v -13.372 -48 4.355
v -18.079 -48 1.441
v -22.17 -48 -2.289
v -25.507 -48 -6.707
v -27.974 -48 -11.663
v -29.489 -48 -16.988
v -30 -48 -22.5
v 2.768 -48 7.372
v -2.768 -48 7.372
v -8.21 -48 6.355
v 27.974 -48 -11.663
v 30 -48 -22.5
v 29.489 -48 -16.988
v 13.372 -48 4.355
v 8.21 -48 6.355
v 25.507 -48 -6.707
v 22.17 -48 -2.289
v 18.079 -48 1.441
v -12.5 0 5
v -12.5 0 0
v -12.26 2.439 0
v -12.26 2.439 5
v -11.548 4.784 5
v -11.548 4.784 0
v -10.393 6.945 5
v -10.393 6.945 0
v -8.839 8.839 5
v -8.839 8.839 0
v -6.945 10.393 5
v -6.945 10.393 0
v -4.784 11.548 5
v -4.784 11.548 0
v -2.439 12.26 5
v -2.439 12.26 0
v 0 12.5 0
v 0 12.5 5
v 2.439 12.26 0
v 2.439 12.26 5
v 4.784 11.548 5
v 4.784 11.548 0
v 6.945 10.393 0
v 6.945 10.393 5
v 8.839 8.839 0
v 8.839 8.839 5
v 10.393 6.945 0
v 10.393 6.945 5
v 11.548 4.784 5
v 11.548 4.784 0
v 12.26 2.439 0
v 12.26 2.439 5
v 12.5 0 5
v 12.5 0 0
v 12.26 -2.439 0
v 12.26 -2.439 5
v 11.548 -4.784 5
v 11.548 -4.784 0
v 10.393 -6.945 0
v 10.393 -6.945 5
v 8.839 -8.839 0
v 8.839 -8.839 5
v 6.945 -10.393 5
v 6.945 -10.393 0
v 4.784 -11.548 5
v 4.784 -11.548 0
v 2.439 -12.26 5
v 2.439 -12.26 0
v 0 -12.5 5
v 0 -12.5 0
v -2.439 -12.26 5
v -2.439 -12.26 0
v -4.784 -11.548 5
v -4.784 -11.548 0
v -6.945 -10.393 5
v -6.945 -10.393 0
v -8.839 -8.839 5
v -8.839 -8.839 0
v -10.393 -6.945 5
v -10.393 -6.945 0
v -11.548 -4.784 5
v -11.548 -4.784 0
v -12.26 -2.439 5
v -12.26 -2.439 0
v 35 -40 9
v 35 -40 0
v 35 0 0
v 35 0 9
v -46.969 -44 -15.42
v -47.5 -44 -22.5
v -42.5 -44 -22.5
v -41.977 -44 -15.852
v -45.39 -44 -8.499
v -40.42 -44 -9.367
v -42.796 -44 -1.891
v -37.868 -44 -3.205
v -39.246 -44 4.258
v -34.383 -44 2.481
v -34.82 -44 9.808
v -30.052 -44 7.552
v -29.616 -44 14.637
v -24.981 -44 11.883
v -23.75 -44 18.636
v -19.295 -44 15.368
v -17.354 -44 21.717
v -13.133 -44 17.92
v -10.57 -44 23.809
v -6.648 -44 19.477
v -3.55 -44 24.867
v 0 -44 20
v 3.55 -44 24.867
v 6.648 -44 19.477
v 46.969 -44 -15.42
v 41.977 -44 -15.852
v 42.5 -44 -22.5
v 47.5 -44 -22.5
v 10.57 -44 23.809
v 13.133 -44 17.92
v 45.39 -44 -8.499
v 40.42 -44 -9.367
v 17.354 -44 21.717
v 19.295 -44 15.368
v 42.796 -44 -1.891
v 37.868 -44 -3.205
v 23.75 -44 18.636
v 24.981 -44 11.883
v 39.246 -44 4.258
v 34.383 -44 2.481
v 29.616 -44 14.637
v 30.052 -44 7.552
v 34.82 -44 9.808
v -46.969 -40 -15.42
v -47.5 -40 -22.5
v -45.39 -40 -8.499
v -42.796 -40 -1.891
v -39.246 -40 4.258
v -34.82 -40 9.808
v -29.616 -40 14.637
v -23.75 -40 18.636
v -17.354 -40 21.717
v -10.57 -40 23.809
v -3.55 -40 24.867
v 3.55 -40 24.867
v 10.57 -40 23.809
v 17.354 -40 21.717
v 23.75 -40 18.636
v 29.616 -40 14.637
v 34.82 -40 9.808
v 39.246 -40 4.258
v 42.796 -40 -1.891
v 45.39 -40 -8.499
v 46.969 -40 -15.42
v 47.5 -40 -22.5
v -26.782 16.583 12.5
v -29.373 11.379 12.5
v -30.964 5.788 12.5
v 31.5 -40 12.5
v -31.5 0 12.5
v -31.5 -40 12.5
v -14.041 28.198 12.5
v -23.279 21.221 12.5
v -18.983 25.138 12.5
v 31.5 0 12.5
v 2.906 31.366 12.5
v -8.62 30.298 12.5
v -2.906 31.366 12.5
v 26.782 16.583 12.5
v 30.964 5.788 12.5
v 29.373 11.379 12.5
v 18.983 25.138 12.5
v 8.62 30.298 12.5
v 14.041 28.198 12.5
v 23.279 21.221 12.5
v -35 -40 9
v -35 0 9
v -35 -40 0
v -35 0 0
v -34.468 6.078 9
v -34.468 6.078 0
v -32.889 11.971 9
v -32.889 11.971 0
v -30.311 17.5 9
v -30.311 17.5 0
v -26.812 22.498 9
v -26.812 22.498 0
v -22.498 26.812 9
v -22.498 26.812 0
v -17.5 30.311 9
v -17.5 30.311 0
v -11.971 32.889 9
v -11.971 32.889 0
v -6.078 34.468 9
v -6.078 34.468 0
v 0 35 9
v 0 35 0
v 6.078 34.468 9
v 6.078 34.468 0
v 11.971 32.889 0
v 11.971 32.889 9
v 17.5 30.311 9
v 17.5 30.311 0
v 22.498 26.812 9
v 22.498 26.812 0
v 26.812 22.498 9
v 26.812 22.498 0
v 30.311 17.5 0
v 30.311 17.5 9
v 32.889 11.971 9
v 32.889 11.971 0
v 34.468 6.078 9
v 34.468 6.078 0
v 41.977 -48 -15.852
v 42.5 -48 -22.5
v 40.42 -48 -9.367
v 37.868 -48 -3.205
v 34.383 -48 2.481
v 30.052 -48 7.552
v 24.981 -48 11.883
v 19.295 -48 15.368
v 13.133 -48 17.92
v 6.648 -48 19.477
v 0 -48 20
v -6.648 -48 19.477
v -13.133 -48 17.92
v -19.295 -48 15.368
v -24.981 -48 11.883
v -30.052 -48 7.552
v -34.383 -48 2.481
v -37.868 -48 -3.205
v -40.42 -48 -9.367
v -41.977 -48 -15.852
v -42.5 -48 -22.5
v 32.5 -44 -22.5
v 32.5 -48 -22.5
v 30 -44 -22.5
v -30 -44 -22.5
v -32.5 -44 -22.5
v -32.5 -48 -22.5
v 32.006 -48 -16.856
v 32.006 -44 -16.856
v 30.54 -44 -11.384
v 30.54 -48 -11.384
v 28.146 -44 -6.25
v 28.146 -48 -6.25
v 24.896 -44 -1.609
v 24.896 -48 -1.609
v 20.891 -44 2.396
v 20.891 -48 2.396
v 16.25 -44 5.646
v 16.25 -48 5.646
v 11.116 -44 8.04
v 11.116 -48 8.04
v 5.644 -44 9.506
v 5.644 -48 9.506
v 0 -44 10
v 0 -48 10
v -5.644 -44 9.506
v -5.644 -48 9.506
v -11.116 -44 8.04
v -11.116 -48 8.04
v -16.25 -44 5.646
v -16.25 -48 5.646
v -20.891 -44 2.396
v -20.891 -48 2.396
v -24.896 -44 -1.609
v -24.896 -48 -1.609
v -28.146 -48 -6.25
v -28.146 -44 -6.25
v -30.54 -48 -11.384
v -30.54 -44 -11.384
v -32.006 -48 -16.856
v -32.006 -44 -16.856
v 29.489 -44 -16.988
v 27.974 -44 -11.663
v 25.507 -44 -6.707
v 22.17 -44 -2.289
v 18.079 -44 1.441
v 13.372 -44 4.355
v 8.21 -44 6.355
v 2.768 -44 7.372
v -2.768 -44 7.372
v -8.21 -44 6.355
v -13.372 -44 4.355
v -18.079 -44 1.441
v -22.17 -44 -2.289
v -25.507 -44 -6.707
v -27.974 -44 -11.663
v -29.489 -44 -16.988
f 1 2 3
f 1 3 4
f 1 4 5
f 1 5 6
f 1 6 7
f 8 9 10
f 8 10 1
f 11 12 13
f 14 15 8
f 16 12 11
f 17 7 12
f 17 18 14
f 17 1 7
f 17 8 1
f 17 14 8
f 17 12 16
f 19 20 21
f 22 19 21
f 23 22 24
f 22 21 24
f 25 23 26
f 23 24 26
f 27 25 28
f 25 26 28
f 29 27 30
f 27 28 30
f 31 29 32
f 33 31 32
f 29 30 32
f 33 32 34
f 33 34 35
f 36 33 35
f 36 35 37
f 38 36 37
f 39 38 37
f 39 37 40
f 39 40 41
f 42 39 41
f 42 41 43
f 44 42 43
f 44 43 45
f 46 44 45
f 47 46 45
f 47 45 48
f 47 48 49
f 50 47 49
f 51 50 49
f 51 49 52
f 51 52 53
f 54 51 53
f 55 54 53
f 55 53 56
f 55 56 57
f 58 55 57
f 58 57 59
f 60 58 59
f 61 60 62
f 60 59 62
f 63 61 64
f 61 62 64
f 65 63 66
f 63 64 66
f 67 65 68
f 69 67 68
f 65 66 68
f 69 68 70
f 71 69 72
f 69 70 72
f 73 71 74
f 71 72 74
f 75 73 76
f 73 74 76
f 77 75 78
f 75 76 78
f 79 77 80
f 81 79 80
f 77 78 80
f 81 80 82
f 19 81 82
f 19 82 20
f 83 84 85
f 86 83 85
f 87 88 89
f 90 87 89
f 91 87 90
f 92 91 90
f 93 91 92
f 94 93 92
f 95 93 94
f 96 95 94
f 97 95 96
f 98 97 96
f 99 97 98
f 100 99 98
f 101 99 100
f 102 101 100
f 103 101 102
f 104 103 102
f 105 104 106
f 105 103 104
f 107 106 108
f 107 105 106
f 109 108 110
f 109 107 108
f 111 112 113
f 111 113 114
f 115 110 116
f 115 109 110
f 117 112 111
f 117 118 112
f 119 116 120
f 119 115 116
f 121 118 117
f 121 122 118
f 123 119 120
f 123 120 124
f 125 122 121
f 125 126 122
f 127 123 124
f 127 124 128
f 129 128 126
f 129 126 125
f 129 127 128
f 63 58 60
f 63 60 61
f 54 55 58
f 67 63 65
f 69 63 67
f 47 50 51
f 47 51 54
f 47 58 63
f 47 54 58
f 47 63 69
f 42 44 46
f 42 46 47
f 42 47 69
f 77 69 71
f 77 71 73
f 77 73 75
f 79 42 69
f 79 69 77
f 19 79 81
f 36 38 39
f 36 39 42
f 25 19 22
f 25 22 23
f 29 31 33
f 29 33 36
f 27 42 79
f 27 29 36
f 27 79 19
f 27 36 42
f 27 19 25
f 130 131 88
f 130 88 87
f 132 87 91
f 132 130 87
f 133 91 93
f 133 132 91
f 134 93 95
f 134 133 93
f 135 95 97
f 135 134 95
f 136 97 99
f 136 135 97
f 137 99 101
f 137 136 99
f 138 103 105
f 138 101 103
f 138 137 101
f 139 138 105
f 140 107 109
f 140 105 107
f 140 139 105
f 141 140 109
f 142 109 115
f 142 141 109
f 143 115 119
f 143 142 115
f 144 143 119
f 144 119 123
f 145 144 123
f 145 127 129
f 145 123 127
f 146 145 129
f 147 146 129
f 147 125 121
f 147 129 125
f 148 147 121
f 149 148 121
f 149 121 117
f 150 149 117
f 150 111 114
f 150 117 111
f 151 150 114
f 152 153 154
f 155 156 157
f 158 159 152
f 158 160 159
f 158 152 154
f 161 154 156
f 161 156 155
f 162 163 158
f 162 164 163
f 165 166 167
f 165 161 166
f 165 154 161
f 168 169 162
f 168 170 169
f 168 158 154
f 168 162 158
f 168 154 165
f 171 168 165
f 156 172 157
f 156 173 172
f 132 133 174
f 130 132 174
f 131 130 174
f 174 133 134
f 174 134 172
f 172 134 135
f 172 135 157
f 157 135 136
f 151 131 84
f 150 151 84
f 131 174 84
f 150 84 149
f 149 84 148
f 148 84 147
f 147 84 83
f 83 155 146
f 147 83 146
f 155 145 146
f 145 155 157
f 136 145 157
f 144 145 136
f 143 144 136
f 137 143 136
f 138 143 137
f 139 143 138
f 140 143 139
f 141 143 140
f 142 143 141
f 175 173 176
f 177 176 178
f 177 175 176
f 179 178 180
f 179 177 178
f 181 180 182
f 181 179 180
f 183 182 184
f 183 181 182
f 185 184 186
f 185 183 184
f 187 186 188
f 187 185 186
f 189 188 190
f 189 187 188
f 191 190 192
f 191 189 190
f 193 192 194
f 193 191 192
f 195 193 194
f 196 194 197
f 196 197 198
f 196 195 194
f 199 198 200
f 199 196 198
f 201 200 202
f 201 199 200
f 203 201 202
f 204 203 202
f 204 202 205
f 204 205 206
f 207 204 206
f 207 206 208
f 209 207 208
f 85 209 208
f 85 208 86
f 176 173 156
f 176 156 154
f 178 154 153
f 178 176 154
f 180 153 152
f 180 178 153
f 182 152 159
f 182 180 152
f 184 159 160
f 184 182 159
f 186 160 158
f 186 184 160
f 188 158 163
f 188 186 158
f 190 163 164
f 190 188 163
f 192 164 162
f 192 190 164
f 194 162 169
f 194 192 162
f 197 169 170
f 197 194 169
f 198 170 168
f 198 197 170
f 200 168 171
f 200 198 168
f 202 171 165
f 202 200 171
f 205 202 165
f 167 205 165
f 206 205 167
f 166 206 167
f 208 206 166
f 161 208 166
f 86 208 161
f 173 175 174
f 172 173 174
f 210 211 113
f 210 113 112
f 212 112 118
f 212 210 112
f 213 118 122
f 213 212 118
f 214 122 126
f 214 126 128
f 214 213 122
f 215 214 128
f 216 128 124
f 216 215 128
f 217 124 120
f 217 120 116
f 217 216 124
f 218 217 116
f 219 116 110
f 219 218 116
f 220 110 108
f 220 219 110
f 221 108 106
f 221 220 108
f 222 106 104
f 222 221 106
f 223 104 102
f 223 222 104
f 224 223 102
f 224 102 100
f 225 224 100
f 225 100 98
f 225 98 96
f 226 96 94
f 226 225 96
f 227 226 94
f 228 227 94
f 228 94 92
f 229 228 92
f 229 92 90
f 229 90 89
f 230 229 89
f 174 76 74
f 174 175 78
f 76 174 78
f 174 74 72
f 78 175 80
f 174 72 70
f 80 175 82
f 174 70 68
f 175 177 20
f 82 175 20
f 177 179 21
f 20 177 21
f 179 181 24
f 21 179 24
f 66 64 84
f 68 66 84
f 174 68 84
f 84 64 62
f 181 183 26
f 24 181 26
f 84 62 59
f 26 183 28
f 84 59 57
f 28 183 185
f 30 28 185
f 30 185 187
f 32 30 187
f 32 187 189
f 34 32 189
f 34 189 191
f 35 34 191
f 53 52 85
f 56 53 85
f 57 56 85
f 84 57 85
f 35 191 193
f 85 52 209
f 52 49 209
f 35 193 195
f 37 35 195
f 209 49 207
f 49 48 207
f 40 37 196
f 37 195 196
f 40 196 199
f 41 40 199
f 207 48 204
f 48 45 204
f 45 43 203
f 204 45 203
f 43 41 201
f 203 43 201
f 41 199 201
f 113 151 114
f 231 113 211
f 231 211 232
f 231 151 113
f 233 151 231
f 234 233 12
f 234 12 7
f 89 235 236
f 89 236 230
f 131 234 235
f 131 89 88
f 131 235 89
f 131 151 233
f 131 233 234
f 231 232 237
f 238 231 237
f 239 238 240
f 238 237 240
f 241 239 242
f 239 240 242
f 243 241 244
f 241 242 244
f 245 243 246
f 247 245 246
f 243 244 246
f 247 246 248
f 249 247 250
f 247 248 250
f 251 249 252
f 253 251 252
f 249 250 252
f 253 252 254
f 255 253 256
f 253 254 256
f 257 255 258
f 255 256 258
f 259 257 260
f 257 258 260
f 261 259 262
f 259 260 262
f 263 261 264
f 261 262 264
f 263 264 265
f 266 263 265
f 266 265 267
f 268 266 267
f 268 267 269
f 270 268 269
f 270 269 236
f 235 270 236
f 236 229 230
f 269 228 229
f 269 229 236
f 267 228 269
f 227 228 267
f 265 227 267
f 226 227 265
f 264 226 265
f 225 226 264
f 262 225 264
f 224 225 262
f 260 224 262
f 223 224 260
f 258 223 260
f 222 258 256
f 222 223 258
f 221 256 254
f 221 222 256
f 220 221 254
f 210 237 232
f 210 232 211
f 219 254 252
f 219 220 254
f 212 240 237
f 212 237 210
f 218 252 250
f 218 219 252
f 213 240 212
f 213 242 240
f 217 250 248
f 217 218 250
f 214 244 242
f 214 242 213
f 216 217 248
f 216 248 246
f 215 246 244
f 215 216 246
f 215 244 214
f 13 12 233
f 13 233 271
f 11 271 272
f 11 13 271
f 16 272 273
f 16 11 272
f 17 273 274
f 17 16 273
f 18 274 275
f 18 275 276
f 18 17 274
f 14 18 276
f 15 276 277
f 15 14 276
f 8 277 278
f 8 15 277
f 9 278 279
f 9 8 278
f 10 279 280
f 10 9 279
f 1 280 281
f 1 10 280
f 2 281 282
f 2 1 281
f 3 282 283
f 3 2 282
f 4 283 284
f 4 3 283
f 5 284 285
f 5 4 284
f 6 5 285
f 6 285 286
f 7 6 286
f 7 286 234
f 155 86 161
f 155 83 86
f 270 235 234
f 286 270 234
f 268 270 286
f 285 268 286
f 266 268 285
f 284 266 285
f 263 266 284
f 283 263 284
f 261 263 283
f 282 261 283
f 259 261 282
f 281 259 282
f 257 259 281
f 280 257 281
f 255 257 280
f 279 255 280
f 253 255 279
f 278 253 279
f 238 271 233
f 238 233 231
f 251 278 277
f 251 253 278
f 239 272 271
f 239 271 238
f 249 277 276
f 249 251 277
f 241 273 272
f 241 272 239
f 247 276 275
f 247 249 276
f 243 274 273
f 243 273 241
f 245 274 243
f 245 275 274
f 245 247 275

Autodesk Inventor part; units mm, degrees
ref_plane "YZ Plane" through (0, 0, 0) normal (1, 0, 0) x (0, 1, 0)
ref_plane "XZ Plane" through (0, 0, 0) normal (0, 1, 0) x (-1, 0, 0)
ref_plane "XY Plane" through (0, 0, 0) normal (0, 0, 1) x (1, 0, 0)
sketch "Sketch1" plane through (0, 0, 0) normal (0, 0, 1) x (1, 0, 0)
  circle A0 centre (0, 0) radius 35
  line L0 (-35, 0) -> (-35, -40)
  line L1 (-35, -40) -> (35, -40)
  line L2 (35, -40) -> (35, 0)
  dimension "d0" = 70
  dimension "d1" = 40
extrude "Extrusion1" add sketch "Sketch1" along normal blind 12.5
sketch "Sketch2" plane through (-35, -40, 0) normal (0, -1, 0) x (1, 0, 0)
  arc A0 (82.5, -22.5) -> (-12.5, -22.5) centre (35, -22.5) ccw
  line L0 (0, 12.5) -> (70, 12.5) construction
  line L1 (35, 12.5) -> (35, 0)
  line L2 (82.5, -22.5) -> (-12.5, -22.5)
  arc A1 (-12.5, -22.5) -> (82.5, -22.5) centre (35, -22.5) ccw construction
  dimension "d4" = 95
  dimension "d6" = 35
extrude "Extrusion2" add sketch "Sketch2" along normal blind 8
chamfer "Chamfer1" distance 3.5 angle 45 3 edges at (0, 35, 12.5) (-35, -20, 12.5) (35, -20, 12.5)
sketch "Sketch3" plane through (0, 0, 0) normal (0, 0, -1) x (-1, 0, 0)
  circle A0 centre (0, 0) radius 12.5
  dimension "d12" = 25
extrude "Extrusion3" cut sketch "Sketch3" against normal blind 5
sketch "Sketch4" plane through (-35, -48, 0) normal (0, -1, 0) x (1, 0, 0)
  arc A0 (82.5, -22.5) -> (-12.5, -22.5) centre (35, -22.5) ccw projected
  arc A1 (77.5, -22.5) -> (-7.5, -22.5) centre (35, -22.5) ccw
  arc A2 (82.5, -22.5) -> (-12.5, -22.5) centre (35, -22.5) ccw projected
  line L0 (-7.5, -22.5) -> (-12.5, -22.5)
  line L1 (82.5, -22.5) -> (77.5, -22.5)
  line L2 (-12.5, -22.5) -> (82.5, -22.5) projected
  circle A3 centre (35, -22.5) radius 32.5
  circle A4 centre (35, -22.5) radius 30
  point P0 (35, 0)
  point P1 (5, -22.5)
  point P2 (65, -22.5)
  point P3 (67.5, -22.5)
  point P4 (2.5, -22.5)
  dimension "d16" = 5
  dimension "d20" = 65
  dimension "d21" = 60
extrude "Extrusion4" cut sketch "Sketch4" against normal blind 4 contours L1 A1 L0 A0 | L2 A4 A3 picked at (43.6934, 7.7339)
properties part number "Base 1 right"
